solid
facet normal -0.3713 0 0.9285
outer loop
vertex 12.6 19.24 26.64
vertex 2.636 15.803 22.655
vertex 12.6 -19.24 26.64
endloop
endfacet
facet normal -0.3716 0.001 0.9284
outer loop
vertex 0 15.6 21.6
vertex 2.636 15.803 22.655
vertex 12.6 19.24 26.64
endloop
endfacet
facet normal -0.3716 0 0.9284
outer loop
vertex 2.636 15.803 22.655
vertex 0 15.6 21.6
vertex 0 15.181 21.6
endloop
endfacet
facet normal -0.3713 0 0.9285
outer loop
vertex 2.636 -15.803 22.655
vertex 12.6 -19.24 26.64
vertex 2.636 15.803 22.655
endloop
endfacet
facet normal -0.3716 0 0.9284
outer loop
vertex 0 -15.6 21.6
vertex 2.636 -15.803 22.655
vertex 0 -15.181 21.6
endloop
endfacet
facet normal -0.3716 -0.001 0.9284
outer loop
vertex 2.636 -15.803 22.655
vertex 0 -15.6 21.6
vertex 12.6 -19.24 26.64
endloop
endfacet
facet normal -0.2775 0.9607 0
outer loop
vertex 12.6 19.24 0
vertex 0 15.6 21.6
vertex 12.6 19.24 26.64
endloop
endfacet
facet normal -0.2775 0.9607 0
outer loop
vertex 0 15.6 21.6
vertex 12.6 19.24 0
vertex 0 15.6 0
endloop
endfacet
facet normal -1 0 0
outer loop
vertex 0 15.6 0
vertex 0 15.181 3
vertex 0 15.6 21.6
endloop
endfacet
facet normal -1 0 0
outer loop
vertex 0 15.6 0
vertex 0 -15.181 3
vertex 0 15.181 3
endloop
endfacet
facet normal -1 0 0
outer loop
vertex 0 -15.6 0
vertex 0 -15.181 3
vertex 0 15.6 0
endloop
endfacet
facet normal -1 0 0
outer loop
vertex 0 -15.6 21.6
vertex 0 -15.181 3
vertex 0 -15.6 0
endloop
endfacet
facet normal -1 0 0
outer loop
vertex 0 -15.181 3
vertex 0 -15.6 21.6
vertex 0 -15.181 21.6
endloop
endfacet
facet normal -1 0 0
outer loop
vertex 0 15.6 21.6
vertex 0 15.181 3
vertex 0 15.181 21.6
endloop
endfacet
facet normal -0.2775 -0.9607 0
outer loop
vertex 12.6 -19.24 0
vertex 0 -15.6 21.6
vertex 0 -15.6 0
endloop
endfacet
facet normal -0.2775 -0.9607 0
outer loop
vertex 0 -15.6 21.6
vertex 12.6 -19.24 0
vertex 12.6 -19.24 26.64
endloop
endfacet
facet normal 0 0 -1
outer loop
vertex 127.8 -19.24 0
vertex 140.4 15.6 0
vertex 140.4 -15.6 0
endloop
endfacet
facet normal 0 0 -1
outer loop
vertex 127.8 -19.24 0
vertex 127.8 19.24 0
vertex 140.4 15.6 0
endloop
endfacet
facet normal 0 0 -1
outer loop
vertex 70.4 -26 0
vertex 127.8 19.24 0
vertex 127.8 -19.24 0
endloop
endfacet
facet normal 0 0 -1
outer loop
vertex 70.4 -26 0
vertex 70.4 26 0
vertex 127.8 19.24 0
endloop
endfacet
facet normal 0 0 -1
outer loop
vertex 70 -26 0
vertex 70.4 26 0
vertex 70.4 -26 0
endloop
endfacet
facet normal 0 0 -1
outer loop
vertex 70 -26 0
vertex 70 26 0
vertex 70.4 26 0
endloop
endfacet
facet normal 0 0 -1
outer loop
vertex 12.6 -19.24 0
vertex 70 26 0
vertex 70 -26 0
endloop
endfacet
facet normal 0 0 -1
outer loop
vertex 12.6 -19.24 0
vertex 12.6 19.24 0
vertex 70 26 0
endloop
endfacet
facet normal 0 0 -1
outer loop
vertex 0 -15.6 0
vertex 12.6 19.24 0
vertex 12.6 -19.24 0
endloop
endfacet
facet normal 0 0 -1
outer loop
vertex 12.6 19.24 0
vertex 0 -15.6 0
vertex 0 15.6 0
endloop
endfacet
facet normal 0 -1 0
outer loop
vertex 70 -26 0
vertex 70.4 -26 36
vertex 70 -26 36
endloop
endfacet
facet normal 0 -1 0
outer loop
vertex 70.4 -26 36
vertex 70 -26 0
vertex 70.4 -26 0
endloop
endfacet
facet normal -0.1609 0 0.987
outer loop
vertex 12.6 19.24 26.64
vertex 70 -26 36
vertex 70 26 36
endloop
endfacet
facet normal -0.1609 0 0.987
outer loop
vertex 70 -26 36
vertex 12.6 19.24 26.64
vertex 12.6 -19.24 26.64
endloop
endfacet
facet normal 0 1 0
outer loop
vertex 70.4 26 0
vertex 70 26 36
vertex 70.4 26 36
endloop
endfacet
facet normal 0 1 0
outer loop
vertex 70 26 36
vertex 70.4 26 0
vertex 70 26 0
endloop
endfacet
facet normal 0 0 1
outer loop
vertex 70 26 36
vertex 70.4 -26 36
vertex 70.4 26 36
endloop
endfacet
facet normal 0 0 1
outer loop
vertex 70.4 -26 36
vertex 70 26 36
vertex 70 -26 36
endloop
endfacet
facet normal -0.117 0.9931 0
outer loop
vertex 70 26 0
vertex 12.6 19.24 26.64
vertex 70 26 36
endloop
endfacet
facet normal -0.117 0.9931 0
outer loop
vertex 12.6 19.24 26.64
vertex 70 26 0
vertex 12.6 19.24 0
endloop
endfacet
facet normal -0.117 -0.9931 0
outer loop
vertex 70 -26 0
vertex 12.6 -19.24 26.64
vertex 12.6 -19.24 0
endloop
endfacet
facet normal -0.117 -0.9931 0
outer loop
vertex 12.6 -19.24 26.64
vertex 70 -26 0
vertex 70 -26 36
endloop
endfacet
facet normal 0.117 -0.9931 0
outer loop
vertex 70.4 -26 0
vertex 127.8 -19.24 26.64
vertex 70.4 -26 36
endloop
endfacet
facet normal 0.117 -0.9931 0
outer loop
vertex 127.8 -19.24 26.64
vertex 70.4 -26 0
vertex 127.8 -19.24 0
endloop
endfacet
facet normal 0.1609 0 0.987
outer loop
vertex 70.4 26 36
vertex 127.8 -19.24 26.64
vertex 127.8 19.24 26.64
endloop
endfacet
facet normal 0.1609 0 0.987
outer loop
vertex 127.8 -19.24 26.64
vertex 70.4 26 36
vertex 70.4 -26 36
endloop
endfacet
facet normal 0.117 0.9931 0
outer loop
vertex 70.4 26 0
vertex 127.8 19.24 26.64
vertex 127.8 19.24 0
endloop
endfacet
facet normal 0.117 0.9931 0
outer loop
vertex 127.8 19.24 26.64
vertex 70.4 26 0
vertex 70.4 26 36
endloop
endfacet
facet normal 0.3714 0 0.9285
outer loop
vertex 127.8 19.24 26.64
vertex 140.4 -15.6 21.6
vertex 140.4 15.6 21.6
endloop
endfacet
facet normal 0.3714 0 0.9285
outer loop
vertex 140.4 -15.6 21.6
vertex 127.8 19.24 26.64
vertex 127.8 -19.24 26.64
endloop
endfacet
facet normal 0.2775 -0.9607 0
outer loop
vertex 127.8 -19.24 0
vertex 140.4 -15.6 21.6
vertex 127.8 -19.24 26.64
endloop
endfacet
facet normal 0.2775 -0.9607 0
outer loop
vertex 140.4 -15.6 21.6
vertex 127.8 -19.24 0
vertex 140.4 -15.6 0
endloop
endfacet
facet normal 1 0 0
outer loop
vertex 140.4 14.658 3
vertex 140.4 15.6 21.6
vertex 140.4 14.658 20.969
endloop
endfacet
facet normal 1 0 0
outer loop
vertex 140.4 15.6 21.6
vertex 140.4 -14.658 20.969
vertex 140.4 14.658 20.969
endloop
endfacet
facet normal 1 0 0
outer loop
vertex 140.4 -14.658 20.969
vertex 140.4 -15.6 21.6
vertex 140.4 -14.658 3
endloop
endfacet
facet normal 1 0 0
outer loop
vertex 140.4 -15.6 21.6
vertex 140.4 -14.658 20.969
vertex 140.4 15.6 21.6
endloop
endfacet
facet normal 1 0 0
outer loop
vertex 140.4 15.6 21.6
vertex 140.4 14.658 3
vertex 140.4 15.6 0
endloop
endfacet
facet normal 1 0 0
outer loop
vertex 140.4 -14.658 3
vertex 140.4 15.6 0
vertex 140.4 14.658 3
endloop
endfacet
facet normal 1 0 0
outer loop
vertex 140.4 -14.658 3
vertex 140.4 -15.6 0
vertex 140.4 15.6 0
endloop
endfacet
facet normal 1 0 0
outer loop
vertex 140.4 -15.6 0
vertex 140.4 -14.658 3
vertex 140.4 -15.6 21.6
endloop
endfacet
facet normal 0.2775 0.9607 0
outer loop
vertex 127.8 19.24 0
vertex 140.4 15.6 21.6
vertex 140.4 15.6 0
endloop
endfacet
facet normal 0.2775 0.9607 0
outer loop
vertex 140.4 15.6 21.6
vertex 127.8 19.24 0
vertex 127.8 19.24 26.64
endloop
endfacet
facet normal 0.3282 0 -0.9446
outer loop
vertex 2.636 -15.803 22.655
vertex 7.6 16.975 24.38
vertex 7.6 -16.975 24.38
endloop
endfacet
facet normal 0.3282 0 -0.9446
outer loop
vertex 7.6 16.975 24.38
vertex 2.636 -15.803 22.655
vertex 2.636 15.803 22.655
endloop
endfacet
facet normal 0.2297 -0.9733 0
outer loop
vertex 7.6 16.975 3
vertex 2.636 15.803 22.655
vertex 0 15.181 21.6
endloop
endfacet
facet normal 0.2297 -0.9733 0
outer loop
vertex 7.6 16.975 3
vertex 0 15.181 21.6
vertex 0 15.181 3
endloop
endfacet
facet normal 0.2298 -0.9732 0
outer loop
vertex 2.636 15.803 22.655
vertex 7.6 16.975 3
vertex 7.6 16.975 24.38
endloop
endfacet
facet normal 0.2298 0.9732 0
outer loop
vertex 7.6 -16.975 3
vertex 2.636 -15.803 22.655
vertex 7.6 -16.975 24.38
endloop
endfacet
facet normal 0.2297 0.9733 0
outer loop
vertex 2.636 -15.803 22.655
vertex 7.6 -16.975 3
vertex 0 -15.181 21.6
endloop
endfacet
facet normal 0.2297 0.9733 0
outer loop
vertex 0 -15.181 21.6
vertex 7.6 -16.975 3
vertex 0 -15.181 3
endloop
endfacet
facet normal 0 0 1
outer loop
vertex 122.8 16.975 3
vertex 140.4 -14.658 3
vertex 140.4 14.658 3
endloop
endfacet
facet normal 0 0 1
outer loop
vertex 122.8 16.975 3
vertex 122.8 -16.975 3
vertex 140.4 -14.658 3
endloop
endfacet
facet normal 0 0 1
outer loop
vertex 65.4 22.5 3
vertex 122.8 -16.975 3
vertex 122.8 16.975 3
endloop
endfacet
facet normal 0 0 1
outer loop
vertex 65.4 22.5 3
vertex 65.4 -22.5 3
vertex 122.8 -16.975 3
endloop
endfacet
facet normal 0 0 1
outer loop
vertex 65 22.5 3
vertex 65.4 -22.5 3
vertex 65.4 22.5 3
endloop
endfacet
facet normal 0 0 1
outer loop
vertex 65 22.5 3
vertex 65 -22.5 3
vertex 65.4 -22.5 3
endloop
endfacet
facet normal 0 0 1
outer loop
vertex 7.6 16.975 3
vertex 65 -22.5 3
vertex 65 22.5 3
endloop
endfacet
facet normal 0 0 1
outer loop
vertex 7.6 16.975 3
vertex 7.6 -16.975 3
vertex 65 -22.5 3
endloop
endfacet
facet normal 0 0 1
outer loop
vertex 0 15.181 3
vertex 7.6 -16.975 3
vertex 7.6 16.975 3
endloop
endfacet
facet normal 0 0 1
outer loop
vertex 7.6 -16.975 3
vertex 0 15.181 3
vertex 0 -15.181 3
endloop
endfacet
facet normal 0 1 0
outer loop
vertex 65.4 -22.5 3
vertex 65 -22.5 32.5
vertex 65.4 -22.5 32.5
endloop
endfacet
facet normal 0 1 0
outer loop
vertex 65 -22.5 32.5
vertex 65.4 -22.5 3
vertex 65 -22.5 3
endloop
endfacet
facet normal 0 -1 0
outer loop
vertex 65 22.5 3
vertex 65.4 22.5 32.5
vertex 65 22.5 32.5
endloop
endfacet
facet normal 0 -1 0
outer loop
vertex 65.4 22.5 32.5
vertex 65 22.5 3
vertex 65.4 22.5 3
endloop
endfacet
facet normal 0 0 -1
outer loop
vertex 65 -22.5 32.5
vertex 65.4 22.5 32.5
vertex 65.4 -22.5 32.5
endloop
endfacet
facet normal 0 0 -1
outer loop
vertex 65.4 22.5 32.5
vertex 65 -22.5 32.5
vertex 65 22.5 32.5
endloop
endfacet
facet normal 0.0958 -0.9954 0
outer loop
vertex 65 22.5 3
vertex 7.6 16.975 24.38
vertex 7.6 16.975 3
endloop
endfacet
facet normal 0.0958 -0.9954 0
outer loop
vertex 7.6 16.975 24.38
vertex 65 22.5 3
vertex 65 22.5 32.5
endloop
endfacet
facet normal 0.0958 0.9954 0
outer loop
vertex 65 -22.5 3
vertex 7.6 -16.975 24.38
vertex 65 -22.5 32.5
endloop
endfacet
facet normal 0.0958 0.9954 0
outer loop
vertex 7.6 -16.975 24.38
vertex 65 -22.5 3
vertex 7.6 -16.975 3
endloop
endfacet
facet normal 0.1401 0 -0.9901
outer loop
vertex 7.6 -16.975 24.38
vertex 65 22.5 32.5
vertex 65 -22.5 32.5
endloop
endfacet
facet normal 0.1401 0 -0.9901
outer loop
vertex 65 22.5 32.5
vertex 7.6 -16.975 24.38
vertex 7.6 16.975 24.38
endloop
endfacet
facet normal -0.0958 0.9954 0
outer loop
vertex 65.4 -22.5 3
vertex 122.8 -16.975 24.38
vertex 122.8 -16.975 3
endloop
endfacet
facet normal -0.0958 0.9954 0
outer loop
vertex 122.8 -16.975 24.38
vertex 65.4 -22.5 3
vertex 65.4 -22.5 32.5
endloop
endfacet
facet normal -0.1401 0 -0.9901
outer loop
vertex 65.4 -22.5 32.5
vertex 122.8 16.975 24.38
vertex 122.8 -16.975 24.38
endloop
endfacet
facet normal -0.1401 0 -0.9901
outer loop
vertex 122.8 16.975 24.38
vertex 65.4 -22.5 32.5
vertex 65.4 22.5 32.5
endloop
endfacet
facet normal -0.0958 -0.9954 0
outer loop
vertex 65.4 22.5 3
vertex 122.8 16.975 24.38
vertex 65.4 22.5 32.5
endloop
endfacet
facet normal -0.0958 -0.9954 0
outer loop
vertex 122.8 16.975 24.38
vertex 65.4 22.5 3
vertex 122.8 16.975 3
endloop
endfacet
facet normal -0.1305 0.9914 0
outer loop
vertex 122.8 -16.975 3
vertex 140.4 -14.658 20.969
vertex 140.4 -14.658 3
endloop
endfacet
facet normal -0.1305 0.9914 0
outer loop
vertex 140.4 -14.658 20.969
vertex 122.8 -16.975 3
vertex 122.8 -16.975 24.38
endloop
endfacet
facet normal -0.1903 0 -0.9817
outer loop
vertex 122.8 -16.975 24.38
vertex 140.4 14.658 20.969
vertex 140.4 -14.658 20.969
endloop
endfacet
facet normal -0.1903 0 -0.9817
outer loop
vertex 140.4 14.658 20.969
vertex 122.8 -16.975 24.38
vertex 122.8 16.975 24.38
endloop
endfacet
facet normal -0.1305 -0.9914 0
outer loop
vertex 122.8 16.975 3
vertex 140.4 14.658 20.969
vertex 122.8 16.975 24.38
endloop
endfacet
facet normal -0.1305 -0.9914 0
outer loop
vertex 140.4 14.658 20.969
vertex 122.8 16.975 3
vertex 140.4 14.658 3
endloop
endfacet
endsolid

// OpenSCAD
$fn = 32;

// ----------------------------------------------------------------------
// Faired channel: 140 x 52 x 36 mm, 3.5 mm walls, faired ends
// ----------------------------------------------------------------------

// --- parameters (mm) ---
length = 140;             // channel length
width = 52;               // channel width at mid length
height = 36;              // channel height at mid length
wall = 3.5;               // side wall thickness
floor_t = 3;              // floor thickness
end_w = 31.2;             // faired end width
end_h = 21.6;             // faired end height

difference() {
  union() {
    hull() {
      translate([0, -15.6, 0]) cube([0.4, 31.2, 21.6]);
      translate([12.6, -19.24, 0]) cube([0.4, 38.48, 26.64]);
    }
    hull() {
      translate([12.6, -19.24, 0]) cube([0.4, 38.48, 26.64]);
      translate([70, -26, 0]) cube([0.4, 52, 36]);
    }
    hull() {
      translate([70, -26, 0]) cube([0.4, 52, 36]);
      translate([127.4, -19.24, 0]) cube([0.4, 38.48, 26.64]);
    }
    hull() {
      translate([127.4, -19.24, 0]) cube([0.4, 38.48, 26.64]);
      translate([140, -15.6, 0]) cube([0.4, 31.2, 21.6]);
    }
  }
  /* cavity, 5 mm proud of both ends so the ports are cut clean */
  hull() {
    translate([-5, -14, 3]) cube([0.4, 28, 17]);
    translate([7.6, -16.975, 3]) cube([0.4, 33.95, 21.38]);
  }
  hull() {
    translate([7.6, -16.975, 3]) cube([0.4, 33.95, 21.38]);
    translate([65, -22.5, 3]) cube([0.4, 45, 29.5]);
  }
  hull() {
    translate([65, -22.5, 3]) cube([0.4, 45, 29.5]);
    translate([122.4, -16.975, 3]) cube([0.4, 33.95, 21.38]);
  }
  hull() {
    translate([122.4, -16.975, 3]) cube([0.4, 33.95, 21.38]);
    translate([145, -14, 3]) cube([0.4, 28, 17]);
  }
}
